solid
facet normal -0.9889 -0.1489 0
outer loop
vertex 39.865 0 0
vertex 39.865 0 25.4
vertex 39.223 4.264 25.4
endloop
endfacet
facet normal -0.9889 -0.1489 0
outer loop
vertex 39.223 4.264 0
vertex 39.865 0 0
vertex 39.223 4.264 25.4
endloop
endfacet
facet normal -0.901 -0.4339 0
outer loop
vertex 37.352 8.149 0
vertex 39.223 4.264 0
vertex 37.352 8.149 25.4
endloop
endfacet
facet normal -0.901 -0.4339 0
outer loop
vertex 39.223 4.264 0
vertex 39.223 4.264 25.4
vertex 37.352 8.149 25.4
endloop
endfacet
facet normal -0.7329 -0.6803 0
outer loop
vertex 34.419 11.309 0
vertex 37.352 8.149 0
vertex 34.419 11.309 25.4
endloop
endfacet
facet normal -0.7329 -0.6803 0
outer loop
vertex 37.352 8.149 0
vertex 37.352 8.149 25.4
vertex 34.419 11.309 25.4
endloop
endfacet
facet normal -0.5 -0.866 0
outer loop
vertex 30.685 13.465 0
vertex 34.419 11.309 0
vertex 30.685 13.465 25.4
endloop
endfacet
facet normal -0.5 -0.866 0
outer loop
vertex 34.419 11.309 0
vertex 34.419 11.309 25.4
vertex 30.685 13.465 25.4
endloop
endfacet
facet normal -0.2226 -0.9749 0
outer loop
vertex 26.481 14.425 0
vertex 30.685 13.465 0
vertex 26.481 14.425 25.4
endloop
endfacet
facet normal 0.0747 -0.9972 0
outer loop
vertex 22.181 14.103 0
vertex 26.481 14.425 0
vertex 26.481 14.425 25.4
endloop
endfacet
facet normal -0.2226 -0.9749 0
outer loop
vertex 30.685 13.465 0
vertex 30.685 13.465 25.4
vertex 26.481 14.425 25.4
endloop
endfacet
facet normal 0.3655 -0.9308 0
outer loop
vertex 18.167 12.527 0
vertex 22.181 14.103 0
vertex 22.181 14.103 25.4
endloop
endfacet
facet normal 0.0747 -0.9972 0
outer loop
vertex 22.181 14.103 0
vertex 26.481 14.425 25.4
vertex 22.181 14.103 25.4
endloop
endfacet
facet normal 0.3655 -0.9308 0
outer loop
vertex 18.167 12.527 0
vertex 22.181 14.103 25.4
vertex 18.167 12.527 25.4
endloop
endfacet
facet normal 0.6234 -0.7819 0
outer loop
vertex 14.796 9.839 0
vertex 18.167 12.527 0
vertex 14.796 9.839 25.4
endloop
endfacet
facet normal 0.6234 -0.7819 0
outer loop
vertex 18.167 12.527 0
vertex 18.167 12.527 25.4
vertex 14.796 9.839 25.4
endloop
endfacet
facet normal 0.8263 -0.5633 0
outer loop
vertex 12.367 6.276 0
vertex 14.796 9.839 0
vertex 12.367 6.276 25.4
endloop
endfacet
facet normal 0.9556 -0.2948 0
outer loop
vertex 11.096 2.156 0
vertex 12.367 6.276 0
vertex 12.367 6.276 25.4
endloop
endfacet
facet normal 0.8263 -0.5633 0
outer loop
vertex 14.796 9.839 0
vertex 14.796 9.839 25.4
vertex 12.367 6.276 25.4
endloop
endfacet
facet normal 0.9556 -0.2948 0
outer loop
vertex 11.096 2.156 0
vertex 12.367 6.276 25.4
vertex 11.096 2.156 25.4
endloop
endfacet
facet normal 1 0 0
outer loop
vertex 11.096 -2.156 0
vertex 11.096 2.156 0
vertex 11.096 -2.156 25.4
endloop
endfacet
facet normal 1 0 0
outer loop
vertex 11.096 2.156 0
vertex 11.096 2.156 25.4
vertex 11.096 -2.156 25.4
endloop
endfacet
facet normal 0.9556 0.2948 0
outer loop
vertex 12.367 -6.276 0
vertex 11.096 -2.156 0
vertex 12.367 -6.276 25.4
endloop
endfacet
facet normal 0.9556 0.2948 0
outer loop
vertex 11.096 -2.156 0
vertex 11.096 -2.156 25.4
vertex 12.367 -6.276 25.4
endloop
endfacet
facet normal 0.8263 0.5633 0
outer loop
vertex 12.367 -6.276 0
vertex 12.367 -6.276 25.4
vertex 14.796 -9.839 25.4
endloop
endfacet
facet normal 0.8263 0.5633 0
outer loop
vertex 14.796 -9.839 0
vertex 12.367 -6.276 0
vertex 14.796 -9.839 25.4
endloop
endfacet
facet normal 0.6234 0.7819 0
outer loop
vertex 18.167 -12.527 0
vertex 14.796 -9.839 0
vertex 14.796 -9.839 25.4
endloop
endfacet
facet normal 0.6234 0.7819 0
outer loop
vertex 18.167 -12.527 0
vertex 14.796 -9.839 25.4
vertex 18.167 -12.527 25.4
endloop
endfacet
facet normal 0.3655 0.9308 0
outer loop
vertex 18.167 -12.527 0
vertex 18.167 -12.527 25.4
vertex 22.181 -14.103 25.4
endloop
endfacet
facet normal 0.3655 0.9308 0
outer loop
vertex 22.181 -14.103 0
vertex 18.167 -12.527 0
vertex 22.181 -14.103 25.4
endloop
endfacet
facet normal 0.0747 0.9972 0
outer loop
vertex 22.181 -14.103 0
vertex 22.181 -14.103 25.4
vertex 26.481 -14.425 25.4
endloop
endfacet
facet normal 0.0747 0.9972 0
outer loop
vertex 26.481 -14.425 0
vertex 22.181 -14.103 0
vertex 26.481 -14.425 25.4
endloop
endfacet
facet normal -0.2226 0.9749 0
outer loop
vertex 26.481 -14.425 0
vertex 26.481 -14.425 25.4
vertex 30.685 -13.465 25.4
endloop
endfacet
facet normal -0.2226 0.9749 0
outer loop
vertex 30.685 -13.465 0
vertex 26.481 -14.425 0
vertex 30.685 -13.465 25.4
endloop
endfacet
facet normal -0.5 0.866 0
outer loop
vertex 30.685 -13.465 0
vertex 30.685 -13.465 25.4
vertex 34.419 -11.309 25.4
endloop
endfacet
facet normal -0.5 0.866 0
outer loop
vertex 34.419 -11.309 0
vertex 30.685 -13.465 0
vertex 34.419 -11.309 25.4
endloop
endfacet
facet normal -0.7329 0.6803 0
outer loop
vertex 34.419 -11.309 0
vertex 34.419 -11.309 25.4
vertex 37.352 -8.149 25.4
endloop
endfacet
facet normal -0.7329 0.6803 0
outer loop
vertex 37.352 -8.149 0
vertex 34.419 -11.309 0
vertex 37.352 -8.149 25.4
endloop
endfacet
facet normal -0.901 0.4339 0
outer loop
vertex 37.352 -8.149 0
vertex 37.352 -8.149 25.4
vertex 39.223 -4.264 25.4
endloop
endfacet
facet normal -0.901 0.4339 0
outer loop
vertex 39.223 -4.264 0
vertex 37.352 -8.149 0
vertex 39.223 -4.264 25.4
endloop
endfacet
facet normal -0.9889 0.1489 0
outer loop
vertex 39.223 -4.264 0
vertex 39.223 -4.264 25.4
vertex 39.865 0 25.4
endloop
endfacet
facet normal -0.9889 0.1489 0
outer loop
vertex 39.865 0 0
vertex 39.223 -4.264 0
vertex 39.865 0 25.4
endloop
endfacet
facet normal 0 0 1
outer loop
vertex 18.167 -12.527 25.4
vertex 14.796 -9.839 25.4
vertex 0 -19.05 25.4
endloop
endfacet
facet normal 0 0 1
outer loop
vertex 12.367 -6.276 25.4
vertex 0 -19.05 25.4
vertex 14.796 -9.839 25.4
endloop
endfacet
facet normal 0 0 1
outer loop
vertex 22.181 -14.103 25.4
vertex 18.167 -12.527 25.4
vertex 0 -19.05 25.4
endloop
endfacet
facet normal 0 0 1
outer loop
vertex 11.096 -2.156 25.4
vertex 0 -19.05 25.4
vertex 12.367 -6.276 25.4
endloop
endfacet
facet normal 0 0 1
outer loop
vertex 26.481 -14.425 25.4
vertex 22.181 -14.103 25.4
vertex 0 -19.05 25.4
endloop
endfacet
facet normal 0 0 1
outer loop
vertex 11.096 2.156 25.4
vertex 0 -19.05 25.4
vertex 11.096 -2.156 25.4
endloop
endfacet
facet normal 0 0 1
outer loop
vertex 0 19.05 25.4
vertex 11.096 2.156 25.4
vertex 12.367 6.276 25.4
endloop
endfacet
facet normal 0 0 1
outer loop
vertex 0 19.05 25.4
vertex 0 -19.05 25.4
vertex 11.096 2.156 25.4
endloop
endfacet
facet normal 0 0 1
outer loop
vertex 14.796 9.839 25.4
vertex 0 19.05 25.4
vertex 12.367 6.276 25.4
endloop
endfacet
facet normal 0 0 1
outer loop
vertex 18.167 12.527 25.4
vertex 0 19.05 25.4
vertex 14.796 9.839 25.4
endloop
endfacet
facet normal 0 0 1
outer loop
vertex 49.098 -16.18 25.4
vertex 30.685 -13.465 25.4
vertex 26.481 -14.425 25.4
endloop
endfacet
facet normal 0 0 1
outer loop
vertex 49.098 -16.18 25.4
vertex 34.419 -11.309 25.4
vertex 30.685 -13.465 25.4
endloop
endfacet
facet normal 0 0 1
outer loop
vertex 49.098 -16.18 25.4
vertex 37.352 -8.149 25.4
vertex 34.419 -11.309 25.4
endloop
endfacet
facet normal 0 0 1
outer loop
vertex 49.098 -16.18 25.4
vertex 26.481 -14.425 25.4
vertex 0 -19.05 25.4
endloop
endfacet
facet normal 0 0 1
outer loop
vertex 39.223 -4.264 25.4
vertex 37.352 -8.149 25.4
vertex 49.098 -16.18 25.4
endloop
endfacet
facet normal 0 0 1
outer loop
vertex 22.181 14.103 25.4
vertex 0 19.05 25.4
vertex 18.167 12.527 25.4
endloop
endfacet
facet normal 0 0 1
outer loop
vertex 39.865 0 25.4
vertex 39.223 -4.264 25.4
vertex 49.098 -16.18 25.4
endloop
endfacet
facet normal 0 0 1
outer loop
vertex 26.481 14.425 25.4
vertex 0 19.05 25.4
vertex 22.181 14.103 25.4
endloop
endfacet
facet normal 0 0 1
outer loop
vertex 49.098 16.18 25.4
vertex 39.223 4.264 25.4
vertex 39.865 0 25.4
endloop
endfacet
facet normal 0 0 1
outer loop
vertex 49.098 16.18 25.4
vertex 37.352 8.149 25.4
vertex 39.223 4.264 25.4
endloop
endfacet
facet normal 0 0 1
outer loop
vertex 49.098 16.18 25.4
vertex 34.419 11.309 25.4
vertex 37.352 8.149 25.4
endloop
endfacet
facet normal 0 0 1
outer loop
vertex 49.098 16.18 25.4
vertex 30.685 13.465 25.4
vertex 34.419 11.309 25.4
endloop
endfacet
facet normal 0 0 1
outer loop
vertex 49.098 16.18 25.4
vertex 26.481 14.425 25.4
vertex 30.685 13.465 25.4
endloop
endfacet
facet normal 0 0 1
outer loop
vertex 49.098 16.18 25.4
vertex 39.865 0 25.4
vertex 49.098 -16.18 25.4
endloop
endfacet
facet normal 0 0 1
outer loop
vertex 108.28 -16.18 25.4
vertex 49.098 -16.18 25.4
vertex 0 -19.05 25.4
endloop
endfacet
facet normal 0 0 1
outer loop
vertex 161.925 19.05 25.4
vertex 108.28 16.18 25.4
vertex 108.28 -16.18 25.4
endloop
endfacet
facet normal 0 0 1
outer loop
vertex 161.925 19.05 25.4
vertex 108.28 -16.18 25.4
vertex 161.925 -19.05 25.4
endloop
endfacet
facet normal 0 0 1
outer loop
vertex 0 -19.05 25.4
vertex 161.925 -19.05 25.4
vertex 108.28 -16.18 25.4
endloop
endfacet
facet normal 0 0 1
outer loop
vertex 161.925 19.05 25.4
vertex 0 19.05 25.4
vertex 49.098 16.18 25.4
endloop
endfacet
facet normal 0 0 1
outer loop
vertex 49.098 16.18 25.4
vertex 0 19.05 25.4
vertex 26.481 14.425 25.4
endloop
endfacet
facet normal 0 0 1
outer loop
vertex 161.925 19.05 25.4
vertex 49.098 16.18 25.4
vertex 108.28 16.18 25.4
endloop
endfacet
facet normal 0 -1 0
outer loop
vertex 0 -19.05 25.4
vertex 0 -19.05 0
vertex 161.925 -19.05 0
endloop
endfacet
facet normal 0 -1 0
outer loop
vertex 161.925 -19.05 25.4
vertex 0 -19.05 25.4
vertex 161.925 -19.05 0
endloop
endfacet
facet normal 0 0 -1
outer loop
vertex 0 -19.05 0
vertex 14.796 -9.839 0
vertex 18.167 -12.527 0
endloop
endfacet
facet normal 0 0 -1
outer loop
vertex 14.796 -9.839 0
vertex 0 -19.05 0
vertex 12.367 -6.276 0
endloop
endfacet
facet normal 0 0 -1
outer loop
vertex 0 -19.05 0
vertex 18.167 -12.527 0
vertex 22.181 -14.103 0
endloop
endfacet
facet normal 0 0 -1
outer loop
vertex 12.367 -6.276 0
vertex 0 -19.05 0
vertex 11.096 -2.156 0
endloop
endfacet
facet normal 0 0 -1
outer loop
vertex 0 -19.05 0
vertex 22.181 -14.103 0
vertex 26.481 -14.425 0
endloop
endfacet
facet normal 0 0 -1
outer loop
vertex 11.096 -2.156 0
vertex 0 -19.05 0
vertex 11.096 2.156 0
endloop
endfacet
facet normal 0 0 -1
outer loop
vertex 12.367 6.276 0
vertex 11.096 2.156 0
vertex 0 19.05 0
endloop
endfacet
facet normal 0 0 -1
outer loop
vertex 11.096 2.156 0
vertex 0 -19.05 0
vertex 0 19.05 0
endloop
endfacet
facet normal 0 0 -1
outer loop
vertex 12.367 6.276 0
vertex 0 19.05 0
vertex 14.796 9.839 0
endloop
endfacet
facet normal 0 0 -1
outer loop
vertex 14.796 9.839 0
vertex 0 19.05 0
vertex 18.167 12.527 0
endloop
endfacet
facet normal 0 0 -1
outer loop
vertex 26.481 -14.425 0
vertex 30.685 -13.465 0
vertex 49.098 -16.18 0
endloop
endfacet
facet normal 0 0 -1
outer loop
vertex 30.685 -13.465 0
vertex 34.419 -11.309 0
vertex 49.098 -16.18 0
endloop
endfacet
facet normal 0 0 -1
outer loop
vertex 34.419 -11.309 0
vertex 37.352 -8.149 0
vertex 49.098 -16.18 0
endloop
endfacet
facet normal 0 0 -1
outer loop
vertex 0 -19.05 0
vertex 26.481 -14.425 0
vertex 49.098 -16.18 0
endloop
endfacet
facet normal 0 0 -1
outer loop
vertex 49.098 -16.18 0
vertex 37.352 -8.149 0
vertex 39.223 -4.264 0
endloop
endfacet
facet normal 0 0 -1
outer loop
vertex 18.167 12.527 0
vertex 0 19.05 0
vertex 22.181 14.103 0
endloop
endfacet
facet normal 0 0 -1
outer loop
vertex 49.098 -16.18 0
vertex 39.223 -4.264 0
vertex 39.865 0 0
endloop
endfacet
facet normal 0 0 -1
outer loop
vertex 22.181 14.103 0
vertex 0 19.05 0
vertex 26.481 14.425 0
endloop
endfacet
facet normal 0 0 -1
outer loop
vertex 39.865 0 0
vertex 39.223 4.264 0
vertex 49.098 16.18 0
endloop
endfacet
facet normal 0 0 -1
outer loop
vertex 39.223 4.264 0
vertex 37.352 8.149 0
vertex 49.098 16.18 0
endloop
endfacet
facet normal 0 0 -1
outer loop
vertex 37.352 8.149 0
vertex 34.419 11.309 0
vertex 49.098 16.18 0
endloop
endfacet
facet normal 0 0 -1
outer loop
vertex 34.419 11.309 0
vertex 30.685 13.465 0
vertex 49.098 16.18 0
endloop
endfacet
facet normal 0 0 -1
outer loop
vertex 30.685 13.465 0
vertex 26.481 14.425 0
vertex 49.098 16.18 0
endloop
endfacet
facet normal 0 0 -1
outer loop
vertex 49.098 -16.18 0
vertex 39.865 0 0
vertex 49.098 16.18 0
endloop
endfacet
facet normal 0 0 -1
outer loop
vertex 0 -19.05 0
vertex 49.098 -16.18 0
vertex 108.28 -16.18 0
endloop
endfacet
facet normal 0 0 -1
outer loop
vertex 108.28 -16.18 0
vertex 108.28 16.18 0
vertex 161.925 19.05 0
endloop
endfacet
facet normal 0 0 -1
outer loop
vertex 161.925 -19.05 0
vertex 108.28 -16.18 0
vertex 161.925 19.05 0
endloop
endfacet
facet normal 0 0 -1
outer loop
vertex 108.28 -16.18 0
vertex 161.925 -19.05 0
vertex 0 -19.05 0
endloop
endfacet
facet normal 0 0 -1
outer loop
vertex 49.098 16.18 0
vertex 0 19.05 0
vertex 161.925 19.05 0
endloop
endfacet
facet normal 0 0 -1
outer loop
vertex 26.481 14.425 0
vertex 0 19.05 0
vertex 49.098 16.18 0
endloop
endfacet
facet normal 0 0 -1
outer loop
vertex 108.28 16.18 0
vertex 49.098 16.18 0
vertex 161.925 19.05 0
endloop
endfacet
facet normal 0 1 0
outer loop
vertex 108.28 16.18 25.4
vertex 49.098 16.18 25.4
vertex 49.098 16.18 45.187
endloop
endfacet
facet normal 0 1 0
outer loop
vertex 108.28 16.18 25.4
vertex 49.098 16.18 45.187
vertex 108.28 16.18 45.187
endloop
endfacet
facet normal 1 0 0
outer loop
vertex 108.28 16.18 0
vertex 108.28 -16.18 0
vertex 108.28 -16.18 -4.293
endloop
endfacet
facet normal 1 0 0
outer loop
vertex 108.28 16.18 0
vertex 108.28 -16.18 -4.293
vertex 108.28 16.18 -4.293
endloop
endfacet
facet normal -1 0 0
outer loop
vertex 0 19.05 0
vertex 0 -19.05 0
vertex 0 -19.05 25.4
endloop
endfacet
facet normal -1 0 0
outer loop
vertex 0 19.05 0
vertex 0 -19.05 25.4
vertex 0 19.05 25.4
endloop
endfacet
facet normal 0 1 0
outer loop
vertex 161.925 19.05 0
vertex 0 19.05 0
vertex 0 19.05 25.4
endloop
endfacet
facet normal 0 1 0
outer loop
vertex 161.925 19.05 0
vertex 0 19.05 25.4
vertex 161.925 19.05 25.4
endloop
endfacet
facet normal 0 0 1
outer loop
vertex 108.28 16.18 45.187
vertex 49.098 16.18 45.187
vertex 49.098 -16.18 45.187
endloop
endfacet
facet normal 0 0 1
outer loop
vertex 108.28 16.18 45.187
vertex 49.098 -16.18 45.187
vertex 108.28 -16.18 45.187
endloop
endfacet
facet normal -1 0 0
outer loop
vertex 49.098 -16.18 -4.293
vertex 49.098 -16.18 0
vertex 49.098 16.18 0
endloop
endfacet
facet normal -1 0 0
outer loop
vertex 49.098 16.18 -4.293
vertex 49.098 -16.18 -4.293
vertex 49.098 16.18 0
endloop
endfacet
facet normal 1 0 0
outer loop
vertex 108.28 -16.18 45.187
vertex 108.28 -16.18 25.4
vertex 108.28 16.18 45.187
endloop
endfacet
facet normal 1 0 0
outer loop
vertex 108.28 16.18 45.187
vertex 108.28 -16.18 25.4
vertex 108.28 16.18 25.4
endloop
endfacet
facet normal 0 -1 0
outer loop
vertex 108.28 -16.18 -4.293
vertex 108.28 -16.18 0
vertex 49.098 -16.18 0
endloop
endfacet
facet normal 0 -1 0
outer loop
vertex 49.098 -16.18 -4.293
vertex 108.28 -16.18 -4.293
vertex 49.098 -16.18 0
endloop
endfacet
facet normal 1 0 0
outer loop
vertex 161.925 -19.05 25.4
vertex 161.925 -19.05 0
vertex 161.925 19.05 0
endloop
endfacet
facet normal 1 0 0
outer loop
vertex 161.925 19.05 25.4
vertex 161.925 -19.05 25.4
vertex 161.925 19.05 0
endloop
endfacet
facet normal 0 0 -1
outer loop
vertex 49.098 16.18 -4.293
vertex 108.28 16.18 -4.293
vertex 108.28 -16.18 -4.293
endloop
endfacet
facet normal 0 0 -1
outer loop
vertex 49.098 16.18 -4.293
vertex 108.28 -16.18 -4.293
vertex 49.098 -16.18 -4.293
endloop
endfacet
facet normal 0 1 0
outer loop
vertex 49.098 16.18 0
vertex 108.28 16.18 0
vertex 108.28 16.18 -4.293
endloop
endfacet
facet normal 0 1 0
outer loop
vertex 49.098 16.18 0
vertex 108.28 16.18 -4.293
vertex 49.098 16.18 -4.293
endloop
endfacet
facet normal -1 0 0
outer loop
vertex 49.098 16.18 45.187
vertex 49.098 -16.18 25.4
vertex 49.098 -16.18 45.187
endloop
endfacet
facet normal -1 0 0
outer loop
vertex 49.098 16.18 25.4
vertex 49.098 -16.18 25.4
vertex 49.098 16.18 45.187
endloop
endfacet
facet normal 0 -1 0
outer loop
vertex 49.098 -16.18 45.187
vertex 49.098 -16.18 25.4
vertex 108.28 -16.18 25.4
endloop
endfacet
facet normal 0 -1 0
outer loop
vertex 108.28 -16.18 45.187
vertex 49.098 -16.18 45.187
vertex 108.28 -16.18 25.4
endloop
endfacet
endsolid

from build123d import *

# Parameters (mm, degrees)
SKETCH1_W           = 161.925
SKETCH1_H           = 38.1
BOSS_EXTRUDE1_DEPTH = 25.4
SKETCH3_W           = 59.182
SKETCH3_H           = 32.3596
BOSS_EXTRUDE3_DEPTH = 19.7866
SKETCH4_W           = 59.182
SKETCH4_H           = 32.3596
BOSS_EXTRUDE4_DEPTH = 4.2926
SKETCH6_R           = 14.4653
CUT_EXTRUDE1_DEPTH  = 30.6926


with BuildPart() as part:
    # Sketch1 → Boss-Extrude1 (new body)
    with BuildSketch(Plane.XY):
        with Locations((80.9625, 0)):
            Rectangle(SKETCH1_W, SKETCH1_H)
    extrude(amount=BOSS_EXTRUDE1_DEPTH)

    # Sketch3 → Boss-Extrude3 (add)
    with BuildSketch(Plane.XY.offset(25.4)):
        with Locations((78.6892, 0)):
            Rectangle(SKETCH3_W, SKETCH3_H)
    extrude(amount=BOSS_EXTRUDE3_DEPTH)

    # Sketch4 → Boss-Extrude4 (add)
    with BuildSketch(Plane(origin=(0, 0, 0), x_dir=(-1, 0, 0), z_dir=(0, 0, -1))):
        with Locations((-78.6892, 0)):
            Rectangle(SKETCH4_W, SKETCH4_H)
    extrude(amount=BOSS_EXTRUDE4_DEPTH)

    # Sketch6 → Cut-Extrude1 (cut, through all)
    with BuildSketch(Plane.XY.offset(25.4)):
        with Locations((25.4, 0)):
            Circle(SKETCH6_R)
    extrude(amount=-CUT_EXTRUDE1_DEPTH, mode=Mode.SUBTRACT)


solid = part.part
